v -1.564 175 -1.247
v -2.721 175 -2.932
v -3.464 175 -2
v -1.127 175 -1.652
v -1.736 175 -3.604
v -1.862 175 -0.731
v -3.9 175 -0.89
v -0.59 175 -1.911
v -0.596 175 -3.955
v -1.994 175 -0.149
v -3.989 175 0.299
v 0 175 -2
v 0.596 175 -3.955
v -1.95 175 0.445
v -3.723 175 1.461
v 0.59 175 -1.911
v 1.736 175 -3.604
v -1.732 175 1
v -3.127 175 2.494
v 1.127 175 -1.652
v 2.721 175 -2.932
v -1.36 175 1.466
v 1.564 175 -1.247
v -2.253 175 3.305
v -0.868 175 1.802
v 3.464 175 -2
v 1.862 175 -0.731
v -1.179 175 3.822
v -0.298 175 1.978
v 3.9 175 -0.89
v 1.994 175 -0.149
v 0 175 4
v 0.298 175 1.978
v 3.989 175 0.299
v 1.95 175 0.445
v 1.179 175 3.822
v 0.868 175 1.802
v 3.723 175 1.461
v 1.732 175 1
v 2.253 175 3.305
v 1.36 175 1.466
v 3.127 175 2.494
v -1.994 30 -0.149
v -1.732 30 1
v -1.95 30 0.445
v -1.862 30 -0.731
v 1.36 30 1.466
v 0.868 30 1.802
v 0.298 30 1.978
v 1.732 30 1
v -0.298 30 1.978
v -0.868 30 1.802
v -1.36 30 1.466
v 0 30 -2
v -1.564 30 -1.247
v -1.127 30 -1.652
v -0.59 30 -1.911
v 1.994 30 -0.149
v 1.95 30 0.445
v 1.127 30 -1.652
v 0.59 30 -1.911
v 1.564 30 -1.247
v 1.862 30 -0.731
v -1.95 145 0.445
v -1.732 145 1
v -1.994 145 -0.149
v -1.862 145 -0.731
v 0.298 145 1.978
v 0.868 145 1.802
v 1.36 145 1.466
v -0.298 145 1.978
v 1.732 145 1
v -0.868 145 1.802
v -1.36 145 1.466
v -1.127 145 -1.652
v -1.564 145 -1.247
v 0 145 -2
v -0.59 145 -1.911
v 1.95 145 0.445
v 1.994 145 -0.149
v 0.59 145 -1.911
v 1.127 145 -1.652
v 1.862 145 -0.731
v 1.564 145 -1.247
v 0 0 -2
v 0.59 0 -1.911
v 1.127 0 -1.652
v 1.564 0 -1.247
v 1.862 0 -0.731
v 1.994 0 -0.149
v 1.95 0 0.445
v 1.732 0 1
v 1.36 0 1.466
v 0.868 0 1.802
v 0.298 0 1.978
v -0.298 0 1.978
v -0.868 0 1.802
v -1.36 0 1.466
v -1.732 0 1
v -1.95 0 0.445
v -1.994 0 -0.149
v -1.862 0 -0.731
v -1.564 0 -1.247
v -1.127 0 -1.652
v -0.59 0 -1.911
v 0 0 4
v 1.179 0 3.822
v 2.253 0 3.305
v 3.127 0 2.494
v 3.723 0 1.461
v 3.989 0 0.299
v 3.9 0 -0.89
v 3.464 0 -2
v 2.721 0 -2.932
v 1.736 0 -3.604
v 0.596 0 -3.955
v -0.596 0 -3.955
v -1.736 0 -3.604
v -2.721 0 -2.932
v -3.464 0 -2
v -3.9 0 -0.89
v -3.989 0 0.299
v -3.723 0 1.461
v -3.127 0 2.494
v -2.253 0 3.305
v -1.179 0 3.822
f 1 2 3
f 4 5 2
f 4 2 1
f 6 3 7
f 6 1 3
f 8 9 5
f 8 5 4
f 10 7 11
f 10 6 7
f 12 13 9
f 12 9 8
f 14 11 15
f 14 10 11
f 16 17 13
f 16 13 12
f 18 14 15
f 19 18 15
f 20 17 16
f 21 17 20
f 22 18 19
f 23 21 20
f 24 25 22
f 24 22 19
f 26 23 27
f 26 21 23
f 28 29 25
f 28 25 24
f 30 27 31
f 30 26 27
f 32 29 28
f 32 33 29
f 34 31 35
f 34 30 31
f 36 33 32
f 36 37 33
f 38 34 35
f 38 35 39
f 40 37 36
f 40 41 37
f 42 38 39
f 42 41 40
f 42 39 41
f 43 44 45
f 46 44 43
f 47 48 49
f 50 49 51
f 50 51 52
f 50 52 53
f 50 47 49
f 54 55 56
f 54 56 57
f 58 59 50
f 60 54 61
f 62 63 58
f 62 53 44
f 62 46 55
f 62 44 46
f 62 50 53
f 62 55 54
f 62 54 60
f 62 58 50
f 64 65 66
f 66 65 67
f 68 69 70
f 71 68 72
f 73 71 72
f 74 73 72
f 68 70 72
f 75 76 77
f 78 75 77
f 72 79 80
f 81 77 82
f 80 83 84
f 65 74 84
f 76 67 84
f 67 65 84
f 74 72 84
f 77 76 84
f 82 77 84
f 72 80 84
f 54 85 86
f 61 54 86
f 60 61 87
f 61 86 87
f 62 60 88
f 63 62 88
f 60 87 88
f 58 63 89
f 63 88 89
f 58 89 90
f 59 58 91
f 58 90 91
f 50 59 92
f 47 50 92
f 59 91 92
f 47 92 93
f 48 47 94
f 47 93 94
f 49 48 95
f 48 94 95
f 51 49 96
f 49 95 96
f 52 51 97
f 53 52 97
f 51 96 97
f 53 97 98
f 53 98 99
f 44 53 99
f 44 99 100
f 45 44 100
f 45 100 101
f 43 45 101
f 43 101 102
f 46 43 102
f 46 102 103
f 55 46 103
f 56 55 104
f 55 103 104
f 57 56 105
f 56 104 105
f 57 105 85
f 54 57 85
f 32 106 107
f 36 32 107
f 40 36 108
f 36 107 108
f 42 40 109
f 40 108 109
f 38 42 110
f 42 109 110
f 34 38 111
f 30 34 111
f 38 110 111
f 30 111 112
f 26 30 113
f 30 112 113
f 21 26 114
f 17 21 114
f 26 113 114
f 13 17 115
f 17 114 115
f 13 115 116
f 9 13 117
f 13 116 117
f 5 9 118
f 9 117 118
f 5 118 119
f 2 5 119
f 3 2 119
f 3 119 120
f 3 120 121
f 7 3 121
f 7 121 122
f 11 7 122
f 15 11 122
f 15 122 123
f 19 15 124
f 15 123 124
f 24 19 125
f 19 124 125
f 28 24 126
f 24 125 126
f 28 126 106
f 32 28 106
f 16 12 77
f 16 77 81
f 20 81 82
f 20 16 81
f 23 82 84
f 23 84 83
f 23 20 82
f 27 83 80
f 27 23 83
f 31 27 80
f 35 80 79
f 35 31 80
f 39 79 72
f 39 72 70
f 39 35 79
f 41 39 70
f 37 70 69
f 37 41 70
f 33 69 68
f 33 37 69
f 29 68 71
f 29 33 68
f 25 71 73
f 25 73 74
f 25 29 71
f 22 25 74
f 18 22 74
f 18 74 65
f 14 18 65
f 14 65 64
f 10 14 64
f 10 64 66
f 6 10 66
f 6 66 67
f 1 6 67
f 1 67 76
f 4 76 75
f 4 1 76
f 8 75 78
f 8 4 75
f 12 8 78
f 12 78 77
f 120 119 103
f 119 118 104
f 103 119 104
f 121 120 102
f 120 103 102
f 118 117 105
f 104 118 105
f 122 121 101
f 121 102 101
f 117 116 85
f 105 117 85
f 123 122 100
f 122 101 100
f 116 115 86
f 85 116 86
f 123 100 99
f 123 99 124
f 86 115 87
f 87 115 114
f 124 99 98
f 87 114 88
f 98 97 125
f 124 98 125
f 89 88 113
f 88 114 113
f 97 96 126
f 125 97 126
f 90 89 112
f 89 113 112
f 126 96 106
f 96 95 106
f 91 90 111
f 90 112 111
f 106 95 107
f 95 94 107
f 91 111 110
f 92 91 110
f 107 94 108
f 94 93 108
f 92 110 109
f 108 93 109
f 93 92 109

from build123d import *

# Parameters (mm, degrees)
SKETCH1_R           = 4
BOSS_EXTRUDE1_DEPTH = 175
SKETCH2_R           = 2
CUT_EXTRUDE1_DEPTH  = 30


with BuildPart() as part:
    # Sketch1 → Boss-Extrude1 (new body)
    with BuildSketch(Plane(origin=(0, 0, 0), x_dir=(1, 0, 0), z_dir=(0, 1, 0))):
        with Locations(Location((0, 0, 0), (0, 0, 270))):
            Circle(SKETCH1_R)
    extrude(amount=BOSS_EXTRUDE1_DEPTH)

    # Sketch2 → Cut-Extrude1 (cut)
    with BuildSketch(Plane.XZ):
        with Locations(Location((0, 0, 0), (0, 0, 270))):
            Circle(SKETCH2_R)
    cut_extrude1 = extrude(amount=-CUT_EXTRUDE1_DEPTH, mode=Mode.SUBTRACT)

    # Mirror1: Cut-Extrude1 across plane
    add(cut_extrude1.mirror(Plane(origin=(0, 87.5, 0), x_dir=(0, 0, 1), z_dir=(0, -1, 0))), mode=Mode.SUBTRACT)


solid = part.part
